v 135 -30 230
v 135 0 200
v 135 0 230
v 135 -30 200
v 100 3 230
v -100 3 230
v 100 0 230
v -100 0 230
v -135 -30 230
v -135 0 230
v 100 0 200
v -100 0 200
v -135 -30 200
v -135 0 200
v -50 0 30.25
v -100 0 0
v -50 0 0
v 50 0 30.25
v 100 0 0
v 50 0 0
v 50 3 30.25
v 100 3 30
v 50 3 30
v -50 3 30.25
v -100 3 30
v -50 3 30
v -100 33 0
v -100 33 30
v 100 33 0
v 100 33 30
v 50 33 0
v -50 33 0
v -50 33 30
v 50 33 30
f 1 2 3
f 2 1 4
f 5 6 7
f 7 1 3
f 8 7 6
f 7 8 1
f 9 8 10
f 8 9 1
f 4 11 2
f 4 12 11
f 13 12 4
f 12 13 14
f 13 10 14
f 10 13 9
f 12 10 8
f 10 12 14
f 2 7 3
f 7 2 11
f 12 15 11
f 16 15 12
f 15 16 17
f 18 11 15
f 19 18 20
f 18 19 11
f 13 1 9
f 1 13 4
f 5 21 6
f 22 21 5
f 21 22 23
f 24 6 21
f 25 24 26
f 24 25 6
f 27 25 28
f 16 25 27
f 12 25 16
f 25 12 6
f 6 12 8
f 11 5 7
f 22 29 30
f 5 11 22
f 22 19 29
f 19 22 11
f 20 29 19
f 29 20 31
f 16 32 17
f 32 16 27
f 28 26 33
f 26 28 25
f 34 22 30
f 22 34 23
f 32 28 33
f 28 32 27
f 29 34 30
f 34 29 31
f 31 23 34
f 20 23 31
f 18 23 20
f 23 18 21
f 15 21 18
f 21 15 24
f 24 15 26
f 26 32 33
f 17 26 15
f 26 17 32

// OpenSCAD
// 3D model representing the motherboard fixture.
// This includes the motherboard mounting bracket, extrusion, and motherboard itself.

$fn=256;

extrusion_width = 30;

// TODO: Accurate measurement
mobo_offset = -20;

mobo_plate_thickness = 3;


module motherboard_mount_3d() {
    module top_extrusion_bar() {
        cube([270, extrusion_width, extrusion_width], center = true);
    }

    module bottom_extrusion_bar() {
        cube([200, extrusion_width, extrusion_width], center = true);
    }

    module mobo_plate() {
        linear_extrude(height = mobo_plate_thickness) {
            square([200, 230], center = true);
        }
    }

    module pcie_cutout() {
        // TODO: Accurate measurement
        cube([100, extrusion_width * 2, extrusion_width + 0.5], center = true);
    }

    difference() {
        union() {
            translate([0, -extrusion_width / 2, 230])
            translate([0, 0, -extrusion_width / 2])
            top_extrusion_bar();

            translate([0, 3, 230 / 2])
            rotate([90, 0, 0])
            mobo_plate();

            translate([0, extrusion_width / 2 + mobo_plate_thickness, extrusion_width / 2])
            bottom_extrusion_bar();
        }

        translate([0, extrusion_width / 2 + mobo_plate_thickness, extrusion_width / 2])
        #pcie_cutout();
    }
}

module motherboard_exclusion_zone() {
    exclusion_height = 45;

    translate([0, 0, exclusion_height / 2])
    cube([200, 200, exclusion_height], center = true);
}

module motherboard_fixture_3d() {
    motherboard_mount_3d();

    %translate([0,mobo_plate_thickness + 5, 200 / 2 + extrusion_width])
    rotate([-90, 0, 0])
    motherboard_exclusion_zone();
}

motherboard_fixture_3d();
